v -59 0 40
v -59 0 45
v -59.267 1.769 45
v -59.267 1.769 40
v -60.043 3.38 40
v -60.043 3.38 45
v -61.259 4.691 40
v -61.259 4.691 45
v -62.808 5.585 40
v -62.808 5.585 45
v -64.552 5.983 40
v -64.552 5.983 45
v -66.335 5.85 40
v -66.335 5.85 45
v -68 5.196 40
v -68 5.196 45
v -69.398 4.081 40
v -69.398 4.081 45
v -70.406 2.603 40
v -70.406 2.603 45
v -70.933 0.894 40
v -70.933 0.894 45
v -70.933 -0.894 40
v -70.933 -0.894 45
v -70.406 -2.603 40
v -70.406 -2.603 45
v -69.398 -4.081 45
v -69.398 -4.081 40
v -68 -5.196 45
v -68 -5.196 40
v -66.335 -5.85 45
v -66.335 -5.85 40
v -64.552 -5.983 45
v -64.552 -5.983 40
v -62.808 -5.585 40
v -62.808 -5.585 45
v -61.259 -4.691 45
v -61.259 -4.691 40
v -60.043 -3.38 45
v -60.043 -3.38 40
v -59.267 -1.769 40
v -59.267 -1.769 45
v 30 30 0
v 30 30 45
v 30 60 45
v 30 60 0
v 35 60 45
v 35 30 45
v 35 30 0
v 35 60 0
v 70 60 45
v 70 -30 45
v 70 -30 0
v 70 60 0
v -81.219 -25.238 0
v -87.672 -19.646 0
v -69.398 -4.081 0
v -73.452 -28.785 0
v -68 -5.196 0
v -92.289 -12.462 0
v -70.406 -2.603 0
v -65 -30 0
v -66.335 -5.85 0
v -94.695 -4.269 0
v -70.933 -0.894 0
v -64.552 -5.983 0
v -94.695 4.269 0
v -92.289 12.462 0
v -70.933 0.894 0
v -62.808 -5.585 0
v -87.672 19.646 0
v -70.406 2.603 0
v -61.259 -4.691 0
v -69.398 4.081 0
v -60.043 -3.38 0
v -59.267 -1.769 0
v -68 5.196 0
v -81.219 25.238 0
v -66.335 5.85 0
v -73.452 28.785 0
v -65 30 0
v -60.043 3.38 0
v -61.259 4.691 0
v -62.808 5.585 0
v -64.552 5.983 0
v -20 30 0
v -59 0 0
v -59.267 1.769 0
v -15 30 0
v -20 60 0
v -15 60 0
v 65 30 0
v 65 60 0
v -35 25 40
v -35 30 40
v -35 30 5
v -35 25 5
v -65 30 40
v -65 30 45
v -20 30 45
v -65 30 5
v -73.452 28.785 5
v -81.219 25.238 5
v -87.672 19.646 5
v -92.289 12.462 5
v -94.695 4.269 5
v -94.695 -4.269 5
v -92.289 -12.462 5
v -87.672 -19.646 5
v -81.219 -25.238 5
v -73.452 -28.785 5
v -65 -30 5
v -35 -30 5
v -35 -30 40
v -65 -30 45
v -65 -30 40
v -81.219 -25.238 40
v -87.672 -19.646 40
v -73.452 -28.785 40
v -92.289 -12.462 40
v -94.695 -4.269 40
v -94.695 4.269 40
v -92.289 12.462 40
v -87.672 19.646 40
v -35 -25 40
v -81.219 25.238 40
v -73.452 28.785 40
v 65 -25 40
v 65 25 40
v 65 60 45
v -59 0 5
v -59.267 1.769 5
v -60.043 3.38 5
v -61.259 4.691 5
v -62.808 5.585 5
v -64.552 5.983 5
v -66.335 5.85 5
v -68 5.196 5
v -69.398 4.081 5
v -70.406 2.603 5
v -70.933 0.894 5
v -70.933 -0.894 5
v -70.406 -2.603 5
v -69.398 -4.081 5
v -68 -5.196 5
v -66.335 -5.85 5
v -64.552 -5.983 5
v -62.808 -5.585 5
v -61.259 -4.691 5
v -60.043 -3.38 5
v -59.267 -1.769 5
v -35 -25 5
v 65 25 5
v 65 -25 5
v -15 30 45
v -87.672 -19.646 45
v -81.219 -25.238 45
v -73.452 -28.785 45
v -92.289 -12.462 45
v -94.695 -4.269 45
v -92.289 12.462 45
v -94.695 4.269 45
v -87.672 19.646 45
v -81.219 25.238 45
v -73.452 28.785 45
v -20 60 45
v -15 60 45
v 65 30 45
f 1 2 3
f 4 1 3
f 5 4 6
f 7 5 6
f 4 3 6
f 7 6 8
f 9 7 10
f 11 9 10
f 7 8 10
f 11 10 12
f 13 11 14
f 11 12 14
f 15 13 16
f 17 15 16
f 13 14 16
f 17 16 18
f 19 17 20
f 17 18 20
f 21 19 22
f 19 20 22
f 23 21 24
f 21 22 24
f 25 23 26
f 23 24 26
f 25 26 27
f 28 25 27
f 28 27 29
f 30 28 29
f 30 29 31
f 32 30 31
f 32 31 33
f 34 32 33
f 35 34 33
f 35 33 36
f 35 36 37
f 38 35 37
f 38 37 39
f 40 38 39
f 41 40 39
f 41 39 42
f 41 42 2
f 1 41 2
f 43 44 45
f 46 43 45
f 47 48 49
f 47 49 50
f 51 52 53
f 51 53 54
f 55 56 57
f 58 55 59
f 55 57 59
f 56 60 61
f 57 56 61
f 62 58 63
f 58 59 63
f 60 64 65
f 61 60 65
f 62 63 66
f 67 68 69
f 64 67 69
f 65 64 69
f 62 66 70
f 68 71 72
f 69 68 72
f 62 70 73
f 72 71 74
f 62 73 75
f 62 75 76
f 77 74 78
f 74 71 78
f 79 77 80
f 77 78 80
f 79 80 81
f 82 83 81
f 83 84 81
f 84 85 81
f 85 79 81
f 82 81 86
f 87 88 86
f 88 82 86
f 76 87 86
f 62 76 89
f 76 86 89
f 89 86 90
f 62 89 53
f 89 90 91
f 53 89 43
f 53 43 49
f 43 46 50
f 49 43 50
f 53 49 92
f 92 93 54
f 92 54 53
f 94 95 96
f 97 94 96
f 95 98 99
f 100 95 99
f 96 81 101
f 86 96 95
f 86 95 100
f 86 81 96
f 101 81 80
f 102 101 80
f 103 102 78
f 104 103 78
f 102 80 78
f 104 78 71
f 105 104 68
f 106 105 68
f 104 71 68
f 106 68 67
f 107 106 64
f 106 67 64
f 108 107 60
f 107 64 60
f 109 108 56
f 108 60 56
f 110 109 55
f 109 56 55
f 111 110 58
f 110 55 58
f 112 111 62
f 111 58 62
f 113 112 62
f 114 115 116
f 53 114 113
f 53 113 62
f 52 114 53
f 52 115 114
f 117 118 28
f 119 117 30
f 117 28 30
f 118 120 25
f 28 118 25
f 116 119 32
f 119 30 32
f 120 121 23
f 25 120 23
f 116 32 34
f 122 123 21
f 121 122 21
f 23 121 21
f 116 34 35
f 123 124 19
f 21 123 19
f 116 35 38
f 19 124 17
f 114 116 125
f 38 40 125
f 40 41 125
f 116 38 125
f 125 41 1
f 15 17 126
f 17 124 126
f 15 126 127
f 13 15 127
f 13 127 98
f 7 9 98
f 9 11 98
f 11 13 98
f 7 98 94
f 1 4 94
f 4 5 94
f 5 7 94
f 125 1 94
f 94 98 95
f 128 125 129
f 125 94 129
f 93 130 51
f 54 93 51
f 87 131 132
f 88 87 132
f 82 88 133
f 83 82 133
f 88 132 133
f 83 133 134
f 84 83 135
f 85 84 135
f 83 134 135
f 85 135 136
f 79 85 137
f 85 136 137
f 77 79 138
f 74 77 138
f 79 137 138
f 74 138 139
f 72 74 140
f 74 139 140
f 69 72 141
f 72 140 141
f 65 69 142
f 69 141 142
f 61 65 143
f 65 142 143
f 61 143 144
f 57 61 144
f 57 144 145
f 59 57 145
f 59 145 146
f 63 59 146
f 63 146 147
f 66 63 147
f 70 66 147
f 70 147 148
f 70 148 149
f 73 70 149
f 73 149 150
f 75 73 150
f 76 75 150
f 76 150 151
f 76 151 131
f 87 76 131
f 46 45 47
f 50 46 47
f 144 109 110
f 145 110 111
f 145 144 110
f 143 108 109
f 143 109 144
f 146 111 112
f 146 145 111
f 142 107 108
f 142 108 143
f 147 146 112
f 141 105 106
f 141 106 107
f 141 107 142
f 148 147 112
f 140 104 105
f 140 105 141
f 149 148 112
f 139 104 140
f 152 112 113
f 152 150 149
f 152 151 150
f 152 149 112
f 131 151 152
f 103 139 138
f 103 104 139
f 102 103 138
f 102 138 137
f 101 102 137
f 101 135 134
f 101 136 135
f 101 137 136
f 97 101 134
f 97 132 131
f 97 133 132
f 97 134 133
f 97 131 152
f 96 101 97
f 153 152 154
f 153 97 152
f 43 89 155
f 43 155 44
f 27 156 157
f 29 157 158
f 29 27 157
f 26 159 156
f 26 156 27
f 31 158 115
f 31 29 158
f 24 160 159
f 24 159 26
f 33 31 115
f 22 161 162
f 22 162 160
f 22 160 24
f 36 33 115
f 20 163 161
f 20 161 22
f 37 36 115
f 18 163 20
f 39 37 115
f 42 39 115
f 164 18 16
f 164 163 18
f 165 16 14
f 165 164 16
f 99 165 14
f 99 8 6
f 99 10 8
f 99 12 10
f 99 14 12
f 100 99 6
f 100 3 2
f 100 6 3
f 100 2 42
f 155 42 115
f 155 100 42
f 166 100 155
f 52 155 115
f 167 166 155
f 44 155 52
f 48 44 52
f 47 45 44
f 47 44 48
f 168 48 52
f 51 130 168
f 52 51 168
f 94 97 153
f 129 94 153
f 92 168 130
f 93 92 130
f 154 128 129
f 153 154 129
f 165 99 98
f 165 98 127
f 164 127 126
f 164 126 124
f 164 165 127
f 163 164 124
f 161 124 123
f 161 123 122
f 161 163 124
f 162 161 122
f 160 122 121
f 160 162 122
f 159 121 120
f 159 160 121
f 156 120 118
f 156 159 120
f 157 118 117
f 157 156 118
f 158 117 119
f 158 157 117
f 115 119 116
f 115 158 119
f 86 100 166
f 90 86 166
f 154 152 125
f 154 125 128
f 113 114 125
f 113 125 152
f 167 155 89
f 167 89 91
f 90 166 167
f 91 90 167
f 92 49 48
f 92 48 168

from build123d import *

# Parameters (mm, degrees)
DODANIE_WYCI_GNI_CIE1_DEPTH = 5
SZKIC2_W                    = 100
SZKIC2_H                    = 35
DODANIE_WYCI_GNI_CIE2_DEPTH = 5
SZKIC3_R                    = 6
WYTNIJ_WYCI_GNI_CIE1_DEPTH  = 110.316055545
SZKIC4_W                    = 5
SZKIC4_H                    = 30
SZKIC4_H_2                  = 90
DODANIE_WYCI_GNI_CIE3_DEPTH = 45


with BuildPart() as part:
    # Szkic1 → Dodanie-wyciągnięcie1 (new body)
    with BuildSketch(Plane.XY):
        with BuildLine():
            Line((-65, -30), (65, -30))
            Line((65, -30), (65, 30))
            Line((65, 30), (-65, 30))
            ThreePointArc((-65, 30), (-95, 0), (-65, -30))
        make_face()
    extrude(amount=DODANIE_WYCI_GNI_CIE1_DEPTH)


with BuildPart() as body_2:
    # Lustro2: mirrored copy
    add(part.part.mirror(Plane.XY.offset(22.5)))


with BuildPart() as part_1:
    add(part.part)

    add(body_2.part)  # Dodanie-wyciągnięcie2 merges body 2
    # Szkic2 → Dodanie-wyciągnięcie2 (add)
    with BuildSketch(Plane(origin=(0, 30, 0), x_dir=(1, 0, 0), z_dir=(0, 1, 0))):
        with Locations((15, -22.5)):
            Rectangle(SZKIC2_W, SZKIC2_H)
    dodanie_wyci_gni_cie2 = extrude(amount=-DODANIE_WYCI_GNI_CIE2_DEPTH)

    # Lustro3: Dodanie-wyciągnięcie2 across plane
    add(dodanie_wyci_gni_cie2.mirror(Plane.ZX))

    # Szkic3 → Wytnij-wyciągnięcie1 (cut, through all)
    with BuildSketch(Plane.XY.offset(45)):
        with Locations((-65, 0)):
            Circle(SZKIC3_R)
    extrude(amount=-WYTNIJ_WYCI_GNI_CIE1_DEPTH, mode=Mode.SUBTRACT)

    # Szkic4 → Dodanie-wyciągnięcie3 (add)
    with BuildSketch(Plane.XY.offset(45)):
        with Locations((32.5, 45)):
            Rectangle(SZKIC4_W, SZKIC4_H)
        with Locations((67.5, 15)):
            Rectangle(SZKIC4_W, SZKIC4_H_2)
        with Locations((-17.5, 45)):
            Rectangle(SZKIC4_W, SZKIC4_H)
    extrude(amount=-DODANIE_WYCI_GNI_CIE3_DEPTH)


solid = part_1.part
